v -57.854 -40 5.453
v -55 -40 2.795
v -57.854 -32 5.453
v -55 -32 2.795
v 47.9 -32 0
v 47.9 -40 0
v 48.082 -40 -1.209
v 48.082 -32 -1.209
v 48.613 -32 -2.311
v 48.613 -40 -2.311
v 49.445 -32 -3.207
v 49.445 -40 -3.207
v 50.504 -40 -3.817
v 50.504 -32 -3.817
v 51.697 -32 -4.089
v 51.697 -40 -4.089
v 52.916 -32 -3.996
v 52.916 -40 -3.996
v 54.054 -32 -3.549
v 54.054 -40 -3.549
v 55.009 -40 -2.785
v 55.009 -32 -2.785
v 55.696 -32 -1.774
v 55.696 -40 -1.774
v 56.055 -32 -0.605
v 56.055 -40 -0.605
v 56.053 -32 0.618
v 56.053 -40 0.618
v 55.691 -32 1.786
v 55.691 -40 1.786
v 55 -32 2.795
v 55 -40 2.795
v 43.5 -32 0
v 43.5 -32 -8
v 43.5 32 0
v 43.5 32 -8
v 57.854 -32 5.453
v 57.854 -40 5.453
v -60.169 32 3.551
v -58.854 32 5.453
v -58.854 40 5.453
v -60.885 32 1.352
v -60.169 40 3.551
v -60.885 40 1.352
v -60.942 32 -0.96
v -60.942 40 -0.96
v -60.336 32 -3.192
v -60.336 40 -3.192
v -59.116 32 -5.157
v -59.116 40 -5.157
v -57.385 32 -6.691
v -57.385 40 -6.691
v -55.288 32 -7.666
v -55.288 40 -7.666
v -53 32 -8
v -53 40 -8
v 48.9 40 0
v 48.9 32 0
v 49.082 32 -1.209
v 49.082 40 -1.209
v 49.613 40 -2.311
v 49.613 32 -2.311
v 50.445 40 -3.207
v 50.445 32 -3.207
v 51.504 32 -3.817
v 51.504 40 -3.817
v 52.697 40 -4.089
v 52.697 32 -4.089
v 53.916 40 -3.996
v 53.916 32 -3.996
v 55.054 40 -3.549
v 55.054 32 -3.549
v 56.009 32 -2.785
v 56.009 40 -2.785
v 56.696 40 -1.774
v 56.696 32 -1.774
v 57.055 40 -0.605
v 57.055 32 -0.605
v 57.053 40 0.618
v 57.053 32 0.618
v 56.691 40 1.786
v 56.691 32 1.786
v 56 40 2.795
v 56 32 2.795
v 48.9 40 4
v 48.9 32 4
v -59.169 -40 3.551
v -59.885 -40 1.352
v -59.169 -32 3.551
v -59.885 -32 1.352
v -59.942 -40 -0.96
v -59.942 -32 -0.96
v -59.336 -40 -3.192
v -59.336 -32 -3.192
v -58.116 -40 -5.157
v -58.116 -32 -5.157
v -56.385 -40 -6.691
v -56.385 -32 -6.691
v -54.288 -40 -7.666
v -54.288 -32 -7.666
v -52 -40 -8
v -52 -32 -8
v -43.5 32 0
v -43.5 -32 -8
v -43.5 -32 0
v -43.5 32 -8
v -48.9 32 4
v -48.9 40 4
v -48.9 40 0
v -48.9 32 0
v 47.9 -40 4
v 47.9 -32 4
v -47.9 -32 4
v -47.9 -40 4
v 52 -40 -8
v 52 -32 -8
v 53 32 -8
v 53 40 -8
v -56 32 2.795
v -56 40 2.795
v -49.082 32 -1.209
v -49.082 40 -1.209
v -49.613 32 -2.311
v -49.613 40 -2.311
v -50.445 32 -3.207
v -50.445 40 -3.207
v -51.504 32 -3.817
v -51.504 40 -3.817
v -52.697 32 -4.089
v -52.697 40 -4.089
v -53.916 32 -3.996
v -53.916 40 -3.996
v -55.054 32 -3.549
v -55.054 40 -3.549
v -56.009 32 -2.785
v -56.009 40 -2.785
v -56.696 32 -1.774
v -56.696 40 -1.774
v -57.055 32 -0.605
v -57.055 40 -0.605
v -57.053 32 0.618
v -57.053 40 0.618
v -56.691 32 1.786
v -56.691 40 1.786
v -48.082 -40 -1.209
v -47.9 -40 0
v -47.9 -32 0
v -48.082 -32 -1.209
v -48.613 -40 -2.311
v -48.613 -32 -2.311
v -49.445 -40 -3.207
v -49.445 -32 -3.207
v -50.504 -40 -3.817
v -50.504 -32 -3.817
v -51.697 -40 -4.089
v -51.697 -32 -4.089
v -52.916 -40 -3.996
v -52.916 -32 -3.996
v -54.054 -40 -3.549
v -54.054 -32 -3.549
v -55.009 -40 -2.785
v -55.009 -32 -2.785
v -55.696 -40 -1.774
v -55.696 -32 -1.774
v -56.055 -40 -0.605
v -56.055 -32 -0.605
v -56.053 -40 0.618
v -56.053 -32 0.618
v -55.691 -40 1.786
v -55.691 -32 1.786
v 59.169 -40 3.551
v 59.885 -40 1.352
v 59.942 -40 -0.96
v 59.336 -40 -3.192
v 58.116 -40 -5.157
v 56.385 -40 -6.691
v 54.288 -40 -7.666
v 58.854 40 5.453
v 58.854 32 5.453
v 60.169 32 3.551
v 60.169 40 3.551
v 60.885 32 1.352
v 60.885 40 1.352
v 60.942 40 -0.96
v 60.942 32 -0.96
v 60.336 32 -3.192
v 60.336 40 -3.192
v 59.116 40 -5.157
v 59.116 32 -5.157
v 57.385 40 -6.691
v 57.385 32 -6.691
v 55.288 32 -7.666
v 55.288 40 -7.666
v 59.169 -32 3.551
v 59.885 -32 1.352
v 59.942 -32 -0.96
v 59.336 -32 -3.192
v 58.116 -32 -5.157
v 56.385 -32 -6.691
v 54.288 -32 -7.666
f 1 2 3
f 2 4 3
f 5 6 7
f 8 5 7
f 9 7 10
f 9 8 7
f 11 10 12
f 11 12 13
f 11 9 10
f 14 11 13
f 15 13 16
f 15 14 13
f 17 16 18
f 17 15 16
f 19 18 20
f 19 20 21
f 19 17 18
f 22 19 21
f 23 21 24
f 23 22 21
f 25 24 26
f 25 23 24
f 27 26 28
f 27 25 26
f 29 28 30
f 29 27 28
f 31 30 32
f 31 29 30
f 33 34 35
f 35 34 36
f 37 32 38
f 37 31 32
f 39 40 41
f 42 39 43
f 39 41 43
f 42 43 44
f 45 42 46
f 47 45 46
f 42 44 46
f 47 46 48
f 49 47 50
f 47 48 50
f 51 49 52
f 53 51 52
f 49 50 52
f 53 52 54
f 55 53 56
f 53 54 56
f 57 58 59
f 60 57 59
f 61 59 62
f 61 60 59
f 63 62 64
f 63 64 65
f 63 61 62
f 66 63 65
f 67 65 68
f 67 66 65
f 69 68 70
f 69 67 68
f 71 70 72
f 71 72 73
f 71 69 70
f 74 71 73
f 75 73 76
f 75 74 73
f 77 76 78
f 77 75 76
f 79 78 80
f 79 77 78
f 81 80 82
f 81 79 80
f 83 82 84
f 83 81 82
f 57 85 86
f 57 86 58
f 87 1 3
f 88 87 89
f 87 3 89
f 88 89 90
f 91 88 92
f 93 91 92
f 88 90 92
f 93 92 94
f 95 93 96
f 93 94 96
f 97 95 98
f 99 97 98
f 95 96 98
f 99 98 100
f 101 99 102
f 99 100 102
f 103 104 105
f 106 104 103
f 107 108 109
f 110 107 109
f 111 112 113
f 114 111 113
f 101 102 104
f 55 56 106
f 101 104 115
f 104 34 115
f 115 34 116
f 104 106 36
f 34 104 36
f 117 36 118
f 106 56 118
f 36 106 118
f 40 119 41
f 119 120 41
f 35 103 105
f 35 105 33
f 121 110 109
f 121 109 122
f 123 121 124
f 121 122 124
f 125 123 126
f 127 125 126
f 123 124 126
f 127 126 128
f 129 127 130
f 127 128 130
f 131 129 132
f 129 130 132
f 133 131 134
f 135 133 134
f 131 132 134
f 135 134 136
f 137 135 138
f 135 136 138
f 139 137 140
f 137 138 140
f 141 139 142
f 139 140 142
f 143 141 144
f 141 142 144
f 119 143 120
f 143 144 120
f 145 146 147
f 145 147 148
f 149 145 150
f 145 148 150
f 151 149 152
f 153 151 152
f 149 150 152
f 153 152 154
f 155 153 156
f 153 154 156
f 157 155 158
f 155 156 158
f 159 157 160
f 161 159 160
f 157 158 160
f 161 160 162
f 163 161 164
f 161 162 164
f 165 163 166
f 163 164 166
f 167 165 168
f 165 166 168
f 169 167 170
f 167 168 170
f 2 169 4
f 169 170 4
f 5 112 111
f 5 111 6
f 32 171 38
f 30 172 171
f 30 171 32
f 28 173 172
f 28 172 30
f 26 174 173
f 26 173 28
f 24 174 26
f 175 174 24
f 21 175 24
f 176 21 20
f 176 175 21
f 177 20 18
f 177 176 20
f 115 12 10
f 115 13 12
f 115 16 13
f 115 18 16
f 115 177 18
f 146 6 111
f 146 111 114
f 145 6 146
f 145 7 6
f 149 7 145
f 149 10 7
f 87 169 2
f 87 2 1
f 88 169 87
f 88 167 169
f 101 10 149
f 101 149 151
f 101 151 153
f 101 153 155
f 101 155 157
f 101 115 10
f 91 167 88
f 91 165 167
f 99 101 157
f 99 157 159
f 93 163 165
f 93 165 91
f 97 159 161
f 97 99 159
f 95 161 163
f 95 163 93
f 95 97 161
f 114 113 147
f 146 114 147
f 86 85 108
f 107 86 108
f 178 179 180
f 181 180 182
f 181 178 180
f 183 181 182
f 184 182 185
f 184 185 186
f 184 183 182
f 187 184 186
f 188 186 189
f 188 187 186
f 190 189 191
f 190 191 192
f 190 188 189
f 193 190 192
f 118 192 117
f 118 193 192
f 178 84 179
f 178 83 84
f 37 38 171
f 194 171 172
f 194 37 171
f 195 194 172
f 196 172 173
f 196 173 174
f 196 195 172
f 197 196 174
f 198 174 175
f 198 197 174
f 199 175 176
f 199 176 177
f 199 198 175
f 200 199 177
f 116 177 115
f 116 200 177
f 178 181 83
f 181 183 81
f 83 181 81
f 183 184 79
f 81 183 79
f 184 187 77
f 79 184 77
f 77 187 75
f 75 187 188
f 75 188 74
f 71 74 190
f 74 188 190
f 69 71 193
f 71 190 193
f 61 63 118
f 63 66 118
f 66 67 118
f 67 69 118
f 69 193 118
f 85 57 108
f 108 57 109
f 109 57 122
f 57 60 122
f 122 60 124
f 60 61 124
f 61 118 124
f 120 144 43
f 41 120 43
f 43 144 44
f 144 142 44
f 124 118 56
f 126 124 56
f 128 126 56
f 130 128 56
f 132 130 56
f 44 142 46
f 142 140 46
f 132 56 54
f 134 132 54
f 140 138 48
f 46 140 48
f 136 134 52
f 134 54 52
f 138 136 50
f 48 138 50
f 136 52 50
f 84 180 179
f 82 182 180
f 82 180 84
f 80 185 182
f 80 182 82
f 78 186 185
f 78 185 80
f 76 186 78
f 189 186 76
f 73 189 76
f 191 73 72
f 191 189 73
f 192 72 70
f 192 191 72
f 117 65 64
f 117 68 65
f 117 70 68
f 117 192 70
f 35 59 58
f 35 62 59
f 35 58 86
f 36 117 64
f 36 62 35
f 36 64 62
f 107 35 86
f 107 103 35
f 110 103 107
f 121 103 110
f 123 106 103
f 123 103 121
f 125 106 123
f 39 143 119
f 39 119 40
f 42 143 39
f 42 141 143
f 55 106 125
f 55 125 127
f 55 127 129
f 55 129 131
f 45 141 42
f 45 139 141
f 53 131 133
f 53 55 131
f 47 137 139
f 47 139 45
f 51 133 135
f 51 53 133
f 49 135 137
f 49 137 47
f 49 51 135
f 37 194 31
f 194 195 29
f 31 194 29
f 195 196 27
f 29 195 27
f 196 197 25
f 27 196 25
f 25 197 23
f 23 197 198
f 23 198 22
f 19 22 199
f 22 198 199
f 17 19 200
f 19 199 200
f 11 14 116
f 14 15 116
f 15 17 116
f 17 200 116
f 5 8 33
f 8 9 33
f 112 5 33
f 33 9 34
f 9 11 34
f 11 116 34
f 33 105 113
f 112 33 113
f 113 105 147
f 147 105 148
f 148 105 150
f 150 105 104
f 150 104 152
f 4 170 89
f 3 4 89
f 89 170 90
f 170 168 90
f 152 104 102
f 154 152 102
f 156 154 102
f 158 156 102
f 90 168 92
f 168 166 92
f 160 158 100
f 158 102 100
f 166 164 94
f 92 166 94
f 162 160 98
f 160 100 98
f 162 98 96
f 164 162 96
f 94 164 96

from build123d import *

# Parameters (mm, degrees)
MID_CLIP_DEPTH              = 4
REAR_CLIP_DEPTH             = 4
SZKIC4_W                    = 43.5
SZKIC4_H                    = 64
DODANIE_WYCI_GNI_CIE3_DEPTH = 8


with BuildPart() as part:
    # Szkic2 → Mid Clip (new, symmetric)
    with BuildSketch(Plane(origin=(0, -36, 0), x_dir=(1, 0, 0), z_dir=(0, 1, 0))):
        with BuildLine():
            Line((52, 8), (0, 8))
            Line((0, 8), (0, -4))
            Line((0, -4), (47.9, -4))
            Line((47.9, -4), (47.9, 0))
            ThreePointArc((47.9, 0), (53.501665742, 3.815101571), (55, -2.794637722))
            Line((55, -2.794637722), (57.853658537, -5.452951654))
            ThreePointArc((57.853658537, -5.452951654), (59.335653114, 3.191894952), (52, 8))
        make_face()
    mid_clip = extrude(amount=MID_CLIP_DEPTH, both=True)



with BuildPart() as body_2:
    # Szkic3 → Rear Clip (new, symmetric)
    with BuildSketch(Plane(origin=(0, 36, 0), x_dir=(1, 0, 0), z_dir=(0, 1, 0))):
        with BuildLine():
            Line((53, 8), (0, 8))
            Line((0, 8), (0, -4))
            Line((0, -4), (48.9, -4))
            Line((48.9, -4), (48.9, 0))
            ThreePointArc((48.9, 0), (54.501665742, 3.815101571), (56, -2.794637722))
            Line((56, -2.794637722), (58.853658537, -5.452951654))
            ThreePointArc((58.853658537, -5.452951654), (60.335653114, 3.191894952), (53, 8))
        make_face()
    rear_clip = extrude(amount=REAR_CLIP_DEPTH, both=True)


with BuildPart() as part_1:
    add(part.part)

    add(body_2.part)  # Dodanie-wyciągnięcie3 merges body 2
    # Szkic4 → Dodanie-wyciągnięcie3 (add)
    with BuildSketch(Plane(origin=(0, 0, -8), x_dir=(-1, 0, 0), z_dir=(0, 0, -1))):
        with Locations((-21.75, 0)):
            Rectangle(SZKIC4_W, SZKIC4_H)
    dodanie_wyci_gni_cie3 = extrude(amount=-DODANIE_WYCI_GNI_CIE3_DEPTH)

    # Lustro2: Mid Clip, Rear Clip, Dodanie-wyciągnięcie3 across plane
    add(mid_clip.mirror(Plane(origin=(0, -40, -8), x_dir=(0, 0, 1), z_dir=(-1, 0, 0))))
    add(rear_clip.mirror(Plane(origin=(0, -40, -8), x_dir=(0, 0, 1), z_dir=(-1, 0, 0))))
    add(dodanie_wyci_gni_cie3.mirror(Plane(origin=(0, -40, -8), x_dir=(0, 0, 1), z_dir=(-1, 0, 0))))


solid = part_1.part
